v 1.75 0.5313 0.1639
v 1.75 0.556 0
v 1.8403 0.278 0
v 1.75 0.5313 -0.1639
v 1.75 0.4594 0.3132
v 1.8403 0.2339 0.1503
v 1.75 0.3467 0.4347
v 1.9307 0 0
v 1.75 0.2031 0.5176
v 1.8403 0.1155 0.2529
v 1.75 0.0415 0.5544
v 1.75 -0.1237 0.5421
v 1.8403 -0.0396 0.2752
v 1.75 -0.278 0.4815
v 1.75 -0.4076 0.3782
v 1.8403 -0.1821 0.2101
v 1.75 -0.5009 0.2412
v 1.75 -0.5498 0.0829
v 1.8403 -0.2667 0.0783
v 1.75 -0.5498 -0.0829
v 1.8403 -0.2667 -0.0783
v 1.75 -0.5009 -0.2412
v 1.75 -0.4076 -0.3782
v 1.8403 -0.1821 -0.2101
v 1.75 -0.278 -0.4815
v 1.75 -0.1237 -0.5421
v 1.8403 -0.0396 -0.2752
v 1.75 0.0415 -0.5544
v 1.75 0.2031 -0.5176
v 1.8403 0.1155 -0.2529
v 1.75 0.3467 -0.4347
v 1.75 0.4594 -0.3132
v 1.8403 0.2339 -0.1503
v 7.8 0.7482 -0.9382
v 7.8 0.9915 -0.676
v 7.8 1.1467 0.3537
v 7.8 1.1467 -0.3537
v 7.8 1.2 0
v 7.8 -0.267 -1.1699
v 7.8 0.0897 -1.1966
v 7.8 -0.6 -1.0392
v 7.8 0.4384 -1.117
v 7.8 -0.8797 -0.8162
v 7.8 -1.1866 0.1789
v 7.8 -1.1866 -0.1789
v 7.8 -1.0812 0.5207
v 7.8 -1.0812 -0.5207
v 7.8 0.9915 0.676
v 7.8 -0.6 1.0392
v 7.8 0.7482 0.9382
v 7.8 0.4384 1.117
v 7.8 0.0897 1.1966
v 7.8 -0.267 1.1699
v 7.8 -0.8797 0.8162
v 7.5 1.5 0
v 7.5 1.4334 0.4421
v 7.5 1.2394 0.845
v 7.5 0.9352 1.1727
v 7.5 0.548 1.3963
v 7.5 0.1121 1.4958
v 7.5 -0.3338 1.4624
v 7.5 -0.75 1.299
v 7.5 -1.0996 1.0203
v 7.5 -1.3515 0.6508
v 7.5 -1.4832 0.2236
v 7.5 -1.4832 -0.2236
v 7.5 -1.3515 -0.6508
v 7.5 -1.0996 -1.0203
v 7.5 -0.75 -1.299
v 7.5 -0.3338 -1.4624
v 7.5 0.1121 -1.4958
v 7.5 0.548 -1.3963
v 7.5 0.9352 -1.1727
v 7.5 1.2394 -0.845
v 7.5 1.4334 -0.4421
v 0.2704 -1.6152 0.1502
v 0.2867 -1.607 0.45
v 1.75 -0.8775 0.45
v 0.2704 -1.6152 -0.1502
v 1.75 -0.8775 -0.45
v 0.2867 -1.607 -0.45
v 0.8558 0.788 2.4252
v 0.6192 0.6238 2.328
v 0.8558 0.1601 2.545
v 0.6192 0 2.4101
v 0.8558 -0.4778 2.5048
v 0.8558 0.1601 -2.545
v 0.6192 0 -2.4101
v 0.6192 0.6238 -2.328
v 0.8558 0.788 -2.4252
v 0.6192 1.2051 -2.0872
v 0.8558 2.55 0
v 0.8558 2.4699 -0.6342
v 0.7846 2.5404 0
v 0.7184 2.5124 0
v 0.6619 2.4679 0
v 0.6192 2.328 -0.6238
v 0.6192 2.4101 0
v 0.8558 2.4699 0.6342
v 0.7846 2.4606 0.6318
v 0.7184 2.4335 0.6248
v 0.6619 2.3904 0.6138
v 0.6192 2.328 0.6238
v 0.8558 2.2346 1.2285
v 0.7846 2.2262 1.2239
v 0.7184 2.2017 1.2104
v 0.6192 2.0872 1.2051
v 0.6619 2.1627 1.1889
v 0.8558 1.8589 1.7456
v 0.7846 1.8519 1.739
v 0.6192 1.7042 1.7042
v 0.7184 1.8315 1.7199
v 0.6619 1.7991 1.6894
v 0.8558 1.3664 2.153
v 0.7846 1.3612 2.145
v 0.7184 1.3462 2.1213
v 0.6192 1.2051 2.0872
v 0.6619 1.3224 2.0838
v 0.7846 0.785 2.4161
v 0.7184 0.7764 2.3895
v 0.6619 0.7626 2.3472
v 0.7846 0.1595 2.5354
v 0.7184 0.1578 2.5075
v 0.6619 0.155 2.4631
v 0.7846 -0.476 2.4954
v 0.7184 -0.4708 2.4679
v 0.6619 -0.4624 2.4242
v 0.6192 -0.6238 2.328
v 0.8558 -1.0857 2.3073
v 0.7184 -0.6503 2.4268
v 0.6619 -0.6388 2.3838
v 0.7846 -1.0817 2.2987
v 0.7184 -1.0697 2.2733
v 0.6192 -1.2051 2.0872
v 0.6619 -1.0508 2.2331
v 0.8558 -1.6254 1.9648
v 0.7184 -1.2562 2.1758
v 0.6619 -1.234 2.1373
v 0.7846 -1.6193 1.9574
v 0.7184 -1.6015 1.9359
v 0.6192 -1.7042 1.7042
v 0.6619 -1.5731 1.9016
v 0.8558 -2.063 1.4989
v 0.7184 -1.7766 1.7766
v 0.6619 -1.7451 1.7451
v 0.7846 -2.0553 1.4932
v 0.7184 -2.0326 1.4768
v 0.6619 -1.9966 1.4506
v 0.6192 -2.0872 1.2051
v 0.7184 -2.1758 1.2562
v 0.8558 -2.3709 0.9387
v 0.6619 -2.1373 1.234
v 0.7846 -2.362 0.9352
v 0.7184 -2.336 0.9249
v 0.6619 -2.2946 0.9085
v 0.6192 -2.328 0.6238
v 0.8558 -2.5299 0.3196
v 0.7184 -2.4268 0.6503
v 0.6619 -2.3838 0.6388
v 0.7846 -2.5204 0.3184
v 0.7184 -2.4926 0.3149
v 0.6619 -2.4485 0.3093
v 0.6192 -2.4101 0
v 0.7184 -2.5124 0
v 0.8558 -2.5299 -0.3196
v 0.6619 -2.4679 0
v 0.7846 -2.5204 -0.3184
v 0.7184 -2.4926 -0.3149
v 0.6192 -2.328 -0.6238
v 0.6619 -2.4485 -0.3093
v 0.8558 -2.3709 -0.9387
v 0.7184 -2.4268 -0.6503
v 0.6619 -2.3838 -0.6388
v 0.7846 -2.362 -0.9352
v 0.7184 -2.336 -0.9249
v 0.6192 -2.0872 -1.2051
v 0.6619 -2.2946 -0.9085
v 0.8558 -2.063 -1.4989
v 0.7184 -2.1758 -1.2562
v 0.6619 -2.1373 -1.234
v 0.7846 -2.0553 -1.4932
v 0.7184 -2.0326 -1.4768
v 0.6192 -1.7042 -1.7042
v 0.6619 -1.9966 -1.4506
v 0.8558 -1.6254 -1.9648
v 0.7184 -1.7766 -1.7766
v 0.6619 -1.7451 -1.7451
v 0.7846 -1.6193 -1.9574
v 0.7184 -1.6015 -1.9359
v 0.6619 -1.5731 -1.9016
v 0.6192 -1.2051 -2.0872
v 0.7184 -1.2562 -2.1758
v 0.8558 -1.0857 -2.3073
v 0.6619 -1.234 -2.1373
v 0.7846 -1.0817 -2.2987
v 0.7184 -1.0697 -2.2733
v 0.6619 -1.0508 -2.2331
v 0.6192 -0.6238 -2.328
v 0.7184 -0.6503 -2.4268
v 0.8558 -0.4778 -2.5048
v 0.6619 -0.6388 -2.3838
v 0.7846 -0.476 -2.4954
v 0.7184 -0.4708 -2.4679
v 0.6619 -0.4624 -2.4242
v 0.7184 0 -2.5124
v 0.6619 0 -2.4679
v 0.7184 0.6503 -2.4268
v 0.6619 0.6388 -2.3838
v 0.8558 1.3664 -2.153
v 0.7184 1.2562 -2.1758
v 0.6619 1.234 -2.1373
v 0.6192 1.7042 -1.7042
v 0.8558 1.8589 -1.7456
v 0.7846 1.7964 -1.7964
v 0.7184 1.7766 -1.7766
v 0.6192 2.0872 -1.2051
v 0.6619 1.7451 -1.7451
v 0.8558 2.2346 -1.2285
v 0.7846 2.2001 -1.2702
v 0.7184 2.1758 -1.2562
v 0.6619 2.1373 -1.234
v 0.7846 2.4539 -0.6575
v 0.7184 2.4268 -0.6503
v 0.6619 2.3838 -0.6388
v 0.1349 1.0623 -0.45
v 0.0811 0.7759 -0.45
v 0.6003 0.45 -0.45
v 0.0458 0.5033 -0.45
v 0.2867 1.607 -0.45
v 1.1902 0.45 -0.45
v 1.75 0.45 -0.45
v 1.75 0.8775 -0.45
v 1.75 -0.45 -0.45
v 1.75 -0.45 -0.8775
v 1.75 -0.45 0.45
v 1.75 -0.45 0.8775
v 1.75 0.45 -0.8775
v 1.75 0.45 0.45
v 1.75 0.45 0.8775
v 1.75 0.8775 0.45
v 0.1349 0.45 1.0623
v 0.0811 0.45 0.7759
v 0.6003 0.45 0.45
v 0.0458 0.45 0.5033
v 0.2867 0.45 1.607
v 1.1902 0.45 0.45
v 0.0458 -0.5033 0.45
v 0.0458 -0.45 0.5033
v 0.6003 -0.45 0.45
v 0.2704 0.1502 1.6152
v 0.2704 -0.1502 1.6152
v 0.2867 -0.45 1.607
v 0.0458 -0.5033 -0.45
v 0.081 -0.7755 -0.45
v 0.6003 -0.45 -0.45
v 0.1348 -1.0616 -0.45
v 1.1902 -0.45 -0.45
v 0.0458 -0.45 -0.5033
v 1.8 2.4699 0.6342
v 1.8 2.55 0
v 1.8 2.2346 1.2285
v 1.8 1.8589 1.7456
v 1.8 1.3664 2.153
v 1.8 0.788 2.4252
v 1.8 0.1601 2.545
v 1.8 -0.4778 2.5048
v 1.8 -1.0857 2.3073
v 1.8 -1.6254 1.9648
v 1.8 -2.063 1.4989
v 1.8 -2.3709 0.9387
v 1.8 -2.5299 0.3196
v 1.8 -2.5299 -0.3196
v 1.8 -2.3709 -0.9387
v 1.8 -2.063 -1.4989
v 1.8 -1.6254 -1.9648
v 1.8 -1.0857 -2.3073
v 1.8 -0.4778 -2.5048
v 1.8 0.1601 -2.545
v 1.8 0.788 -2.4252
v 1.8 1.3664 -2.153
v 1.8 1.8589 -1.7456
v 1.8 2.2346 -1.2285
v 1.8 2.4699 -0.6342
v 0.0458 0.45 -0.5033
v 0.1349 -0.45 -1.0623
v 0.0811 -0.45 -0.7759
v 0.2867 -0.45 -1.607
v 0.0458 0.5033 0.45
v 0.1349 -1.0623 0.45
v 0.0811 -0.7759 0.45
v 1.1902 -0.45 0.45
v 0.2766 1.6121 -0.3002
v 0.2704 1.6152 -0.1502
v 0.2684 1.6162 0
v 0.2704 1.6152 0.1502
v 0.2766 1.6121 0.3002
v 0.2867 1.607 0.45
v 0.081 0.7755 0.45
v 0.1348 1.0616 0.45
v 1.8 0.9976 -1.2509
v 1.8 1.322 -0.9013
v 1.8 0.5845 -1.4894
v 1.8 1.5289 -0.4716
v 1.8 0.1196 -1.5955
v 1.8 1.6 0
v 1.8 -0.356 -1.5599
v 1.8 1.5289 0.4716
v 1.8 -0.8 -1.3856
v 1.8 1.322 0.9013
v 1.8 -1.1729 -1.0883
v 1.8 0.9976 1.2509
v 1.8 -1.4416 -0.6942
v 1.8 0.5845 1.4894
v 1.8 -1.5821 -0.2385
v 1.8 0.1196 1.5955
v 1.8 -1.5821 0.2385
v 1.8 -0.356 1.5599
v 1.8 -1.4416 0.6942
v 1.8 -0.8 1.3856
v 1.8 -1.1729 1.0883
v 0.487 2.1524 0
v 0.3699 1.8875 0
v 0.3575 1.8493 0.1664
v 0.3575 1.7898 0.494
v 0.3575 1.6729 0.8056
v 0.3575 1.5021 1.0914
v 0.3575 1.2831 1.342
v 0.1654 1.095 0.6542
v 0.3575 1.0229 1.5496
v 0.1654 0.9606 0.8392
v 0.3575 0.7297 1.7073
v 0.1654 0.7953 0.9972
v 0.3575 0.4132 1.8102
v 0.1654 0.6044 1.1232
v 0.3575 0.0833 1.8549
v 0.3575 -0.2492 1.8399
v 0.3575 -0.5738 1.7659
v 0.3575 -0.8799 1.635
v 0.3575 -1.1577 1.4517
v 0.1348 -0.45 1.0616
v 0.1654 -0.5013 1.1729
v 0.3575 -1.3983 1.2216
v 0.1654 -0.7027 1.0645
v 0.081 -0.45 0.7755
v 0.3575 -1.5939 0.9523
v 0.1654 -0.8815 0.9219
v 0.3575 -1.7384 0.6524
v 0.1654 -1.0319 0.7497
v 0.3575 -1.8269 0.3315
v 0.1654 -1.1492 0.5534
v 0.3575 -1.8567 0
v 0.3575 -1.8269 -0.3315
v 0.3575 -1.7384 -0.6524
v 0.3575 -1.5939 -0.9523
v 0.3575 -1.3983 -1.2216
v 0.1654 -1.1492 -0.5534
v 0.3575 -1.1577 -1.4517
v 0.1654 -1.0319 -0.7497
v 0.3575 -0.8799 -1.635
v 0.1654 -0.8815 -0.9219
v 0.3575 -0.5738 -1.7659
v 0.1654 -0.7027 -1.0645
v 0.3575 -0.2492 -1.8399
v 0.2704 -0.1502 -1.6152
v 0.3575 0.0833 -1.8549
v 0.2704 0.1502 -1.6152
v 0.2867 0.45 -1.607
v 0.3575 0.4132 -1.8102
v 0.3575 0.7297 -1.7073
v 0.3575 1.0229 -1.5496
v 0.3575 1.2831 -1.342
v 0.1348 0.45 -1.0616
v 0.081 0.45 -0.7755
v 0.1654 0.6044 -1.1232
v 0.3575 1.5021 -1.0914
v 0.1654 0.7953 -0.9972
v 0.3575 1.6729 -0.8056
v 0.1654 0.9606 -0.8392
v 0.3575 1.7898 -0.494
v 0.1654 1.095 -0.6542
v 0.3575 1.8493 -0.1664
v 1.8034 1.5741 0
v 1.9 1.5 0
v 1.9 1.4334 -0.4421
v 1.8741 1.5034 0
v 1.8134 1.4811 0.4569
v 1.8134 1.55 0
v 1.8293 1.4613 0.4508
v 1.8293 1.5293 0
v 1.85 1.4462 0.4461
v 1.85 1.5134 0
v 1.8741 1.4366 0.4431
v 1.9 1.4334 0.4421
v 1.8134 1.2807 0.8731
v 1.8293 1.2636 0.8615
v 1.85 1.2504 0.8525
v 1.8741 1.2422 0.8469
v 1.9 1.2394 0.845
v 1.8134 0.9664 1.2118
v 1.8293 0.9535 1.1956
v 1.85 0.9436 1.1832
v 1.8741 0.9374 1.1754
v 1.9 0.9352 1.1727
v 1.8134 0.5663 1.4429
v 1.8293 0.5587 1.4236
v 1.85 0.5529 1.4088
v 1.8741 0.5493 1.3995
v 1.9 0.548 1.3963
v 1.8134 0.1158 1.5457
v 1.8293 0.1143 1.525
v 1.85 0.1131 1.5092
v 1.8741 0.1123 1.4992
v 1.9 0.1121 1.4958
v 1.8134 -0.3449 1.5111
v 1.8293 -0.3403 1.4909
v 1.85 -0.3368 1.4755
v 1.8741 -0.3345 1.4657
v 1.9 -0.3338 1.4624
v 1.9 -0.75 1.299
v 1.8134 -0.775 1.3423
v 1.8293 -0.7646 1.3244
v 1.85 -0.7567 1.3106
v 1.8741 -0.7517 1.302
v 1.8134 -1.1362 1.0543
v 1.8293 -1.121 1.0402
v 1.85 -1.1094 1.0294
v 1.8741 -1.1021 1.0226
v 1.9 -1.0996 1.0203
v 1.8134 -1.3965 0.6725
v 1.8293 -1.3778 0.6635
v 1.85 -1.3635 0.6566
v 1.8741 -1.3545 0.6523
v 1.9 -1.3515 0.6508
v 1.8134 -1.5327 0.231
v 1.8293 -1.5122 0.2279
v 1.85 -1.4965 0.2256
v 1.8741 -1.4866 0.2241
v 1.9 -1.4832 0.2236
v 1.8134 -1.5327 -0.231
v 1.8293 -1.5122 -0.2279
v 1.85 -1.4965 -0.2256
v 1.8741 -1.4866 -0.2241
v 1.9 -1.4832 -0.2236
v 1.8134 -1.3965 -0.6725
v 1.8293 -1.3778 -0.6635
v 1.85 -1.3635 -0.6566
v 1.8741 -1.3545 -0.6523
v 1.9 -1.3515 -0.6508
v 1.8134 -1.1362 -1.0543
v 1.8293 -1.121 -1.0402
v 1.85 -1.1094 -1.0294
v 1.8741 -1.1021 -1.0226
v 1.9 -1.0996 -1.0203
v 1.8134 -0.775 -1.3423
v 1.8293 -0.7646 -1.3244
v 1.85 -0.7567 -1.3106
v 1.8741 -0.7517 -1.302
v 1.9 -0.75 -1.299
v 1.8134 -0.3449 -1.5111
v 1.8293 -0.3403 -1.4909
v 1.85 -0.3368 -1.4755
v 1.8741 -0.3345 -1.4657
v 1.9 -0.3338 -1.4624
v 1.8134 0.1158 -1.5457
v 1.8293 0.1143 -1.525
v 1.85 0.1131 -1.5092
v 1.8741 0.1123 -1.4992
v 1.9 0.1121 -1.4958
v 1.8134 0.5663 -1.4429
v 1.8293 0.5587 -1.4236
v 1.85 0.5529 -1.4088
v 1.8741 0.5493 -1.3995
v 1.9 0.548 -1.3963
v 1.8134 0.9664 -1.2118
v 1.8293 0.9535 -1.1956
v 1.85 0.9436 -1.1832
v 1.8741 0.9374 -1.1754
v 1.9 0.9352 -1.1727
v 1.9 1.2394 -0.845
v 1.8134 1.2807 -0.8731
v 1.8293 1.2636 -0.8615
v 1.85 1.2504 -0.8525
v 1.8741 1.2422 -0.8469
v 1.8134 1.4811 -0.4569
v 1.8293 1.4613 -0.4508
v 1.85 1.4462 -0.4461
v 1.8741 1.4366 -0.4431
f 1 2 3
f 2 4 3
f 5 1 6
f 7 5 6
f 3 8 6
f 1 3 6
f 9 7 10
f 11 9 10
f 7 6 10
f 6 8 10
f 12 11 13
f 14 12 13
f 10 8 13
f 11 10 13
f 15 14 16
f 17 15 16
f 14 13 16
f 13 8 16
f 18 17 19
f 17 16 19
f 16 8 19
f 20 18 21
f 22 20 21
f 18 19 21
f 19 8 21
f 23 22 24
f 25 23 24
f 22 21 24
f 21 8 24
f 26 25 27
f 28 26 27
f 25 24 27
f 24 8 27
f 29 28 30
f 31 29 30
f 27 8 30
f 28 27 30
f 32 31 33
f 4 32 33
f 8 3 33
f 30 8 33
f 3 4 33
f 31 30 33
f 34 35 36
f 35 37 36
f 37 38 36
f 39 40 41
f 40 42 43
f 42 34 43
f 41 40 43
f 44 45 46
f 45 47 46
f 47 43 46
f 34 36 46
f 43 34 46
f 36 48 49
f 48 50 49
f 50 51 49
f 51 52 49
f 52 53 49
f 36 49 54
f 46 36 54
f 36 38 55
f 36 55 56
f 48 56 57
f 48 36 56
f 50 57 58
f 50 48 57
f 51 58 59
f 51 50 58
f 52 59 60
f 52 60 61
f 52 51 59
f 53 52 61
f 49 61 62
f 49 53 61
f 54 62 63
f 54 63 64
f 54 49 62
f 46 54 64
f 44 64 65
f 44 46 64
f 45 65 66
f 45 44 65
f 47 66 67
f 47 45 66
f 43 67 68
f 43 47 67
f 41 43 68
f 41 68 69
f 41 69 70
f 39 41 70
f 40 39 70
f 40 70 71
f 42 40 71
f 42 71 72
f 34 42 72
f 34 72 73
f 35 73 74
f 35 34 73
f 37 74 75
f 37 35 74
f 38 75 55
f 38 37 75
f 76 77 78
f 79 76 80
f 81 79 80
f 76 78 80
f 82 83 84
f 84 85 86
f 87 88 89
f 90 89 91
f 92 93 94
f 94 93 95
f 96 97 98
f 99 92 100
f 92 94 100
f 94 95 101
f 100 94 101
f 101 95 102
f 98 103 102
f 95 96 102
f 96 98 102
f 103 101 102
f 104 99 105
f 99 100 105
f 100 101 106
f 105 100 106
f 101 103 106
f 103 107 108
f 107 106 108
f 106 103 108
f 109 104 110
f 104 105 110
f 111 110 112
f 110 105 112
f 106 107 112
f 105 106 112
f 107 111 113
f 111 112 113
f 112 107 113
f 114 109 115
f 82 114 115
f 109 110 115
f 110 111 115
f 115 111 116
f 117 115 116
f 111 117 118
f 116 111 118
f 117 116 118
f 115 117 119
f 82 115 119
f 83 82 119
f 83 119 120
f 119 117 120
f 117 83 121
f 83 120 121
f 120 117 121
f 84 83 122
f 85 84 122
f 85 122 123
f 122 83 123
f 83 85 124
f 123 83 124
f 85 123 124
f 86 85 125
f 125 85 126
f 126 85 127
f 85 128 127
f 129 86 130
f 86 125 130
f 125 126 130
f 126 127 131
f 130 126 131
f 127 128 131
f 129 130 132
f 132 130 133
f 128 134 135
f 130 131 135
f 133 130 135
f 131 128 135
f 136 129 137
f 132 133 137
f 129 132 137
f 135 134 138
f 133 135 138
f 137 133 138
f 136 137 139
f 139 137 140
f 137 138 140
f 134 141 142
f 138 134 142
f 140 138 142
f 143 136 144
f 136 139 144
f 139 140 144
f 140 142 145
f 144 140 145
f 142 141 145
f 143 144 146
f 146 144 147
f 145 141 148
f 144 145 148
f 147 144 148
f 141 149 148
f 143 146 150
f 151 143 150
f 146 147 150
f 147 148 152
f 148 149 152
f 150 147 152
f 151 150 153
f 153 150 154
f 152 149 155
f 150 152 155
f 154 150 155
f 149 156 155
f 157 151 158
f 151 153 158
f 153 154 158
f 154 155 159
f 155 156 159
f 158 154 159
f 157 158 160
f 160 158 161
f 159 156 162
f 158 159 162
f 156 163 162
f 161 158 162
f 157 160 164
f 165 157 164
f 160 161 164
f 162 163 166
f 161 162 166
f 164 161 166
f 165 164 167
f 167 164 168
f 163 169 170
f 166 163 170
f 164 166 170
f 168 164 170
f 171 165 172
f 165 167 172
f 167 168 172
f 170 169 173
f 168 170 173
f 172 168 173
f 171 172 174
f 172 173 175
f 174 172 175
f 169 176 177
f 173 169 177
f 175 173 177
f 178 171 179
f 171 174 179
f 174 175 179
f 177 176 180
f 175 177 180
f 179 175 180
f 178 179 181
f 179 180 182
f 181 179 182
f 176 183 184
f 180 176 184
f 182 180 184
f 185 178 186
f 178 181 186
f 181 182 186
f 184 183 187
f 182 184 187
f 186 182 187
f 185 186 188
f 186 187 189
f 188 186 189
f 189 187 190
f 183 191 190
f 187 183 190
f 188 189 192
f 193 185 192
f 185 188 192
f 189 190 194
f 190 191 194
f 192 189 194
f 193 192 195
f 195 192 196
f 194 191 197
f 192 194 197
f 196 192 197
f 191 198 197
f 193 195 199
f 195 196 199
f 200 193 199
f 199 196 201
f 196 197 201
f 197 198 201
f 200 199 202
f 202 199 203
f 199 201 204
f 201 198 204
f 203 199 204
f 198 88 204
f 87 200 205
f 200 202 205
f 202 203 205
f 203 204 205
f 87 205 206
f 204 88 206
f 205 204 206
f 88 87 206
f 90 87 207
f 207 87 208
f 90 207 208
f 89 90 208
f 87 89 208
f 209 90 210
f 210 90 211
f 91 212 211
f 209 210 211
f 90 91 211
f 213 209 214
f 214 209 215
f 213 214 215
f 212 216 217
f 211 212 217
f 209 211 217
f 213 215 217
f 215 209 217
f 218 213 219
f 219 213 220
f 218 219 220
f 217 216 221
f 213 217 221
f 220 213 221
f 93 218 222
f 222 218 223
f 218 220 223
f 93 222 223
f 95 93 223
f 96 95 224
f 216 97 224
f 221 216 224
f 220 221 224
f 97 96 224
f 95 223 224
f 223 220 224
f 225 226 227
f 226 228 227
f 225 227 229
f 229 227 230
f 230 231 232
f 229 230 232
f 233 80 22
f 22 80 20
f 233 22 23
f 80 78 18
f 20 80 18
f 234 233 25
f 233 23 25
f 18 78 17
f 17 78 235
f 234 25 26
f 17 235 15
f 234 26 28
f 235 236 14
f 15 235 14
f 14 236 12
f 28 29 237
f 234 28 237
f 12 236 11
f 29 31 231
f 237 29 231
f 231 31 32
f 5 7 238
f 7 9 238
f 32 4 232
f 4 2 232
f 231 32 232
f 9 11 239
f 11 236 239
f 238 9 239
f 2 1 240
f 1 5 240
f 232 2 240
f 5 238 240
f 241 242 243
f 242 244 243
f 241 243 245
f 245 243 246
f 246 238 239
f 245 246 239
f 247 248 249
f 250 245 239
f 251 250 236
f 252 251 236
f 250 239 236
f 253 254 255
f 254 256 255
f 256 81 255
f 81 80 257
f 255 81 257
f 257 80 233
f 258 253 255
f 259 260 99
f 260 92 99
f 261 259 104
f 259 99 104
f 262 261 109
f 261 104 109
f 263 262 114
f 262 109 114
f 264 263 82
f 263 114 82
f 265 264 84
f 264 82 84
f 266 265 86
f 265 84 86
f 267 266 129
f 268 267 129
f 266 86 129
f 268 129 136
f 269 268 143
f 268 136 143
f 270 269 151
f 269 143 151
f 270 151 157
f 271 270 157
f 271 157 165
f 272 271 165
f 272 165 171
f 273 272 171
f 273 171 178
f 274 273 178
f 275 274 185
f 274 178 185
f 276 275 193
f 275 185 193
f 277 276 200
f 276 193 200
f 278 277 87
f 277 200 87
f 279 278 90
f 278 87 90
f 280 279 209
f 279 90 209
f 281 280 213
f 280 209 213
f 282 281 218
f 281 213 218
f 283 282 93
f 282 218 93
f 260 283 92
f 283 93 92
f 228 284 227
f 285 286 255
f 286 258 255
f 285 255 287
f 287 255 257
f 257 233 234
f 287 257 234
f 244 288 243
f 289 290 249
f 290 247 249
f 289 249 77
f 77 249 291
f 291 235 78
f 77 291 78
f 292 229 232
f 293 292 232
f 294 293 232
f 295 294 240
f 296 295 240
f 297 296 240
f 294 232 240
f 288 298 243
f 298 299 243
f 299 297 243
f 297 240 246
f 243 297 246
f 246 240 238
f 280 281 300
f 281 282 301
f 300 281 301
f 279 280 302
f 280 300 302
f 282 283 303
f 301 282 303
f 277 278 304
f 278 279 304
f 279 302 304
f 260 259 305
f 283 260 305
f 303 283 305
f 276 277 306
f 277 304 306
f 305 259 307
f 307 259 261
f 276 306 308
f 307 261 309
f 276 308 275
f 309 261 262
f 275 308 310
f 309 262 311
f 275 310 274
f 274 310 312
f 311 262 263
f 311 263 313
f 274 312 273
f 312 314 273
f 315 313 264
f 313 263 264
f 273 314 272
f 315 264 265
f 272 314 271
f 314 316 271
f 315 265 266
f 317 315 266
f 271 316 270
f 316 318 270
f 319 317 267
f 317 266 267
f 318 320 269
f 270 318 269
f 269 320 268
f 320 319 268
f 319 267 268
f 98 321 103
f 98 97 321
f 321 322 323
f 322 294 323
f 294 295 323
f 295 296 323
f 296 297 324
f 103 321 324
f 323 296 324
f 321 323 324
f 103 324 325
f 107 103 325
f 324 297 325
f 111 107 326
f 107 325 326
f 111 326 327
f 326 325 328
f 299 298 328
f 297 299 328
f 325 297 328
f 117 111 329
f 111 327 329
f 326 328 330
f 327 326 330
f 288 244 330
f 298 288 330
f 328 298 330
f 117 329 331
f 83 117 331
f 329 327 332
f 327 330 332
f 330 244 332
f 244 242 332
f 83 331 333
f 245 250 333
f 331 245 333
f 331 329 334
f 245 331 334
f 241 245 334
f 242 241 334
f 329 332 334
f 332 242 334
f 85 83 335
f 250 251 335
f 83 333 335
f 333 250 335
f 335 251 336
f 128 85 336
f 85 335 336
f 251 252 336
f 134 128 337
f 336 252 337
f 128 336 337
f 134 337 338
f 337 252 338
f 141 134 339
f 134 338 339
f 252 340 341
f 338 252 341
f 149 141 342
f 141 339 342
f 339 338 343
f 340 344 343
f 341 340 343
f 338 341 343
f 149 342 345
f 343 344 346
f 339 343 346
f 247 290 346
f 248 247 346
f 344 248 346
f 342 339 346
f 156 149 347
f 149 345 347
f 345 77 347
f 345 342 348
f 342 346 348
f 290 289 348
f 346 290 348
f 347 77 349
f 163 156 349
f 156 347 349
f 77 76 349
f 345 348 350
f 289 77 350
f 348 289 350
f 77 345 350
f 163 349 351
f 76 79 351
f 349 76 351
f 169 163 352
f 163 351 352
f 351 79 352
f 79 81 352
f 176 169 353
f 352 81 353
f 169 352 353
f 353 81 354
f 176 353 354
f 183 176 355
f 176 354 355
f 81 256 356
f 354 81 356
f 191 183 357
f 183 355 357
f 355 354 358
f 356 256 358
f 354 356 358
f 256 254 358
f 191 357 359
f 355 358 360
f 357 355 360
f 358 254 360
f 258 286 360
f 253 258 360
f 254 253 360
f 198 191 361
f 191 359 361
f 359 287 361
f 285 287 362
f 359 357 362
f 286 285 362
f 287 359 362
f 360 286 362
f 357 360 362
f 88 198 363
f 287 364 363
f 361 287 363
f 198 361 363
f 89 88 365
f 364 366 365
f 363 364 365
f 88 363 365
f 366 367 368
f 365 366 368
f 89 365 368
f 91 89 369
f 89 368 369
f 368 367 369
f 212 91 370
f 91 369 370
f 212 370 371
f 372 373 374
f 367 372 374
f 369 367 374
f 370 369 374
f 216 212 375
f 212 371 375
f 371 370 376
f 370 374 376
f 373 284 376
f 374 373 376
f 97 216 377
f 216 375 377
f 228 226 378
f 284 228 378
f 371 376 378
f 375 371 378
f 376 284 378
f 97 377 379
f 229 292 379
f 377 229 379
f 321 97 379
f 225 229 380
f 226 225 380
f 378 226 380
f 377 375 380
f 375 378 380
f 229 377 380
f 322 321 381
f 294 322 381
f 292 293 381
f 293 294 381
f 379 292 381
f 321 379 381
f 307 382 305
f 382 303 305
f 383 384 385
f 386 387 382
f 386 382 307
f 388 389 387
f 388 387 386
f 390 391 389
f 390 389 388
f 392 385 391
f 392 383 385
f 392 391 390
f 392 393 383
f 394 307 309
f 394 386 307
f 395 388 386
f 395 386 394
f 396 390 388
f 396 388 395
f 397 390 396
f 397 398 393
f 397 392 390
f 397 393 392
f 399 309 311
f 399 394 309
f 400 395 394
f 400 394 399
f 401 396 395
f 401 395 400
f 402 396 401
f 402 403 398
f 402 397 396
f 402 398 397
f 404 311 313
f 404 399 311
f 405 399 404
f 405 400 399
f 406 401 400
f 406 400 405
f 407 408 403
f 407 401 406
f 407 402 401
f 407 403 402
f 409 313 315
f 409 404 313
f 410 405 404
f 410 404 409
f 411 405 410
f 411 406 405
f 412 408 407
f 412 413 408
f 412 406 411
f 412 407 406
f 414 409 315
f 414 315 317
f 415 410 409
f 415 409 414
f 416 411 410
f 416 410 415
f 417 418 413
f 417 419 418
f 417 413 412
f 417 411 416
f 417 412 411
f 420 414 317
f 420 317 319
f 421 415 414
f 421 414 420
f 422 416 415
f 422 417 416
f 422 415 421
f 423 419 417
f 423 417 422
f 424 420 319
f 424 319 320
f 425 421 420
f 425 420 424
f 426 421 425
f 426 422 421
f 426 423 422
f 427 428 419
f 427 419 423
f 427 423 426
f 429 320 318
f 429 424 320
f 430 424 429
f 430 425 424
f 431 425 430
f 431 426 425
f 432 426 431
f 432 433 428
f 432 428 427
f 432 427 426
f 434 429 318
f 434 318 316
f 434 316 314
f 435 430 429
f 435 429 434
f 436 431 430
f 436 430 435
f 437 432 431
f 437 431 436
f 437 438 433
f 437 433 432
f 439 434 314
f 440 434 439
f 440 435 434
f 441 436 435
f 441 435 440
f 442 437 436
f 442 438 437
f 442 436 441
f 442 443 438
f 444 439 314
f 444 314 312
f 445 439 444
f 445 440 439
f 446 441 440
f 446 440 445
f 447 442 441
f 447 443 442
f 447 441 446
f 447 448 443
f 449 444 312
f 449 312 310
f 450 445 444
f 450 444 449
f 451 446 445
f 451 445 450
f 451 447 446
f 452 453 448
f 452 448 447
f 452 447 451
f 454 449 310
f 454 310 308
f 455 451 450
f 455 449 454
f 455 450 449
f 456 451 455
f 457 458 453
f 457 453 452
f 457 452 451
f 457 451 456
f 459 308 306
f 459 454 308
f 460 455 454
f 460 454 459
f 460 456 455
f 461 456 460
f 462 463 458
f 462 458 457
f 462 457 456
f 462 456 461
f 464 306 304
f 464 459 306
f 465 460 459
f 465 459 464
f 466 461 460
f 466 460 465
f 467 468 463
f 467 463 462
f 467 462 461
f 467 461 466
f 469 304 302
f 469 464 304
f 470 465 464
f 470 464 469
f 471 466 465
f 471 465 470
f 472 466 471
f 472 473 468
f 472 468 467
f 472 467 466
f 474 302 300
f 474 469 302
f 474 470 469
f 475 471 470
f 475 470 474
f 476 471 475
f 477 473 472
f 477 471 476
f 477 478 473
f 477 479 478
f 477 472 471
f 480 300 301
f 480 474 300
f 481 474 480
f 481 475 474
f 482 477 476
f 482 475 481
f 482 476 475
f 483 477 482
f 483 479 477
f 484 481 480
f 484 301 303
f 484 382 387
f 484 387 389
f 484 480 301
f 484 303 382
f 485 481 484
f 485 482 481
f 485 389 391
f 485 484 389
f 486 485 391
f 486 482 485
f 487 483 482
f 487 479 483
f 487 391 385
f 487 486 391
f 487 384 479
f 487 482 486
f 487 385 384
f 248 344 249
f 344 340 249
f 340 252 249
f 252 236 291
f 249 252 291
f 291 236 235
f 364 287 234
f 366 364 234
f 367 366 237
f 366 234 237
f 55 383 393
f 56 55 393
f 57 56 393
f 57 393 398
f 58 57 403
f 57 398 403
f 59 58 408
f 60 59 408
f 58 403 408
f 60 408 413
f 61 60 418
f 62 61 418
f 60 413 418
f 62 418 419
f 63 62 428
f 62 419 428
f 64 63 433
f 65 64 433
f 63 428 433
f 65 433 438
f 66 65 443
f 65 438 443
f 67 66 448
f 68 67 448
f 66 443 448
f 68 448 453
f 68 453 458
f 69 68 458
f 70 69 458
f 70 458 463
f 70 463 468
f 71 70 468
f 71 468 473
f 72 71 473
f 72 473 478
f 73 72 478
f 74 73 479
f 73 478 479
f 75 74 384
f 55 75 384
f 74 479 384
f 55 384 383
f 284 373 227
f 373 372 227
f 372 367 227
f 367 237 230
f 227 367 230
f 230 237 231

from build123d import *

# Parameters (mm, degrees)
FILLET1_R       = 0.1
SKETCH3_W       = 0.9
SKETCH3_H       = 3.5
SKETCH4_W       = 0.9
SKETCH4_H       = 1.754964664
RECPAT_COUNT    = 2
RECPAT_ANGLE    = 90
CHANFREIN1_SIZE = 0.3


with BuildPart() as part:
    # BodySke → Base-Revolve (revolve)
    with BuildSketch(Plane.XY):
        with BuildLine():
            Line((1.8, 1.5), (1.8, 2.55))
            Line((1.8, 2.55), (0.855787168, 2.55))
            ThreePointArc((0.855787168, 2.55), (0.718382578, 2.512421984), (0.619225336, 2.410147992))
            ThreePointArc((0.619225336, 2.410147992), (0.157280035, 1.244211935), (0, 0))
            Line((0, 0), (7.8, 0))
            Line((7.8, 0), (7.8, 1.5))
            Line((7.8, 1.5), (1.8, 1.5))
        make_face()
    revolve(axis=Axis((-25.4, 0, 0), (1, 0, 0)))

    # Fillet1
    fillet1_edges = [part.edges().sort_by_distance(p)[0] for p in [
        (1.8, -1.5, 0),
    ]]
    fillet(fillet1_edges, radius=FILLET1_R)

    # Sketch3 → Recess section 0
    with BuildSketch(Plane(origin=(0, 0, 0), x_dir=(0, 0, -1), z_dir=(1, 0, 0))):
        Rectangle(SKETCH3_W, SKETCH3_H)
    # Sketch4 → Recess section 1
    with BuildSketch(Plane(origin=(1.75, 0, 0), x_dir=(0, 0, -1), z_dir=(1, 0, 0))):
        Rectangle(SKETCH4_W, SKETCH4_H)
    recess = loft(mode=Mode.SUBTRACT)

    # RecPat: Recess ×2 about axis
    recpat_axis = Axis((0, 0, 0), (1, 0, 0))
    for i in range(1, RECPAT_COUNT):
        add(recess.rotate(recpat_axis, i * RECPAT_ANGLE / (RECPAT_COUNT - 1)), mode=Mode.SUBTRACT)

    # RecCorSke → RecessCore (revolve, cut)
    with BuildSketch(Plane.XY):
        Polygon((0, 0), (0, 0.678371921), (1.75, 0.556), (1.930655351, 0), align=None)
    revolve(axis=Axis((-3.175, 0, 0), (1, 0, 0)), mode=Mode.SUBTRACT)

    # Chanfrein1
    chanfrein1_edges = [part.edges().sort_by_distance(p)[0] for p in [
        (7.8, -1.5, 0),
    ]]
    chamfer(chanfrein1_edges, length=CHANFREIN1_SIZE)


solid = part.part
